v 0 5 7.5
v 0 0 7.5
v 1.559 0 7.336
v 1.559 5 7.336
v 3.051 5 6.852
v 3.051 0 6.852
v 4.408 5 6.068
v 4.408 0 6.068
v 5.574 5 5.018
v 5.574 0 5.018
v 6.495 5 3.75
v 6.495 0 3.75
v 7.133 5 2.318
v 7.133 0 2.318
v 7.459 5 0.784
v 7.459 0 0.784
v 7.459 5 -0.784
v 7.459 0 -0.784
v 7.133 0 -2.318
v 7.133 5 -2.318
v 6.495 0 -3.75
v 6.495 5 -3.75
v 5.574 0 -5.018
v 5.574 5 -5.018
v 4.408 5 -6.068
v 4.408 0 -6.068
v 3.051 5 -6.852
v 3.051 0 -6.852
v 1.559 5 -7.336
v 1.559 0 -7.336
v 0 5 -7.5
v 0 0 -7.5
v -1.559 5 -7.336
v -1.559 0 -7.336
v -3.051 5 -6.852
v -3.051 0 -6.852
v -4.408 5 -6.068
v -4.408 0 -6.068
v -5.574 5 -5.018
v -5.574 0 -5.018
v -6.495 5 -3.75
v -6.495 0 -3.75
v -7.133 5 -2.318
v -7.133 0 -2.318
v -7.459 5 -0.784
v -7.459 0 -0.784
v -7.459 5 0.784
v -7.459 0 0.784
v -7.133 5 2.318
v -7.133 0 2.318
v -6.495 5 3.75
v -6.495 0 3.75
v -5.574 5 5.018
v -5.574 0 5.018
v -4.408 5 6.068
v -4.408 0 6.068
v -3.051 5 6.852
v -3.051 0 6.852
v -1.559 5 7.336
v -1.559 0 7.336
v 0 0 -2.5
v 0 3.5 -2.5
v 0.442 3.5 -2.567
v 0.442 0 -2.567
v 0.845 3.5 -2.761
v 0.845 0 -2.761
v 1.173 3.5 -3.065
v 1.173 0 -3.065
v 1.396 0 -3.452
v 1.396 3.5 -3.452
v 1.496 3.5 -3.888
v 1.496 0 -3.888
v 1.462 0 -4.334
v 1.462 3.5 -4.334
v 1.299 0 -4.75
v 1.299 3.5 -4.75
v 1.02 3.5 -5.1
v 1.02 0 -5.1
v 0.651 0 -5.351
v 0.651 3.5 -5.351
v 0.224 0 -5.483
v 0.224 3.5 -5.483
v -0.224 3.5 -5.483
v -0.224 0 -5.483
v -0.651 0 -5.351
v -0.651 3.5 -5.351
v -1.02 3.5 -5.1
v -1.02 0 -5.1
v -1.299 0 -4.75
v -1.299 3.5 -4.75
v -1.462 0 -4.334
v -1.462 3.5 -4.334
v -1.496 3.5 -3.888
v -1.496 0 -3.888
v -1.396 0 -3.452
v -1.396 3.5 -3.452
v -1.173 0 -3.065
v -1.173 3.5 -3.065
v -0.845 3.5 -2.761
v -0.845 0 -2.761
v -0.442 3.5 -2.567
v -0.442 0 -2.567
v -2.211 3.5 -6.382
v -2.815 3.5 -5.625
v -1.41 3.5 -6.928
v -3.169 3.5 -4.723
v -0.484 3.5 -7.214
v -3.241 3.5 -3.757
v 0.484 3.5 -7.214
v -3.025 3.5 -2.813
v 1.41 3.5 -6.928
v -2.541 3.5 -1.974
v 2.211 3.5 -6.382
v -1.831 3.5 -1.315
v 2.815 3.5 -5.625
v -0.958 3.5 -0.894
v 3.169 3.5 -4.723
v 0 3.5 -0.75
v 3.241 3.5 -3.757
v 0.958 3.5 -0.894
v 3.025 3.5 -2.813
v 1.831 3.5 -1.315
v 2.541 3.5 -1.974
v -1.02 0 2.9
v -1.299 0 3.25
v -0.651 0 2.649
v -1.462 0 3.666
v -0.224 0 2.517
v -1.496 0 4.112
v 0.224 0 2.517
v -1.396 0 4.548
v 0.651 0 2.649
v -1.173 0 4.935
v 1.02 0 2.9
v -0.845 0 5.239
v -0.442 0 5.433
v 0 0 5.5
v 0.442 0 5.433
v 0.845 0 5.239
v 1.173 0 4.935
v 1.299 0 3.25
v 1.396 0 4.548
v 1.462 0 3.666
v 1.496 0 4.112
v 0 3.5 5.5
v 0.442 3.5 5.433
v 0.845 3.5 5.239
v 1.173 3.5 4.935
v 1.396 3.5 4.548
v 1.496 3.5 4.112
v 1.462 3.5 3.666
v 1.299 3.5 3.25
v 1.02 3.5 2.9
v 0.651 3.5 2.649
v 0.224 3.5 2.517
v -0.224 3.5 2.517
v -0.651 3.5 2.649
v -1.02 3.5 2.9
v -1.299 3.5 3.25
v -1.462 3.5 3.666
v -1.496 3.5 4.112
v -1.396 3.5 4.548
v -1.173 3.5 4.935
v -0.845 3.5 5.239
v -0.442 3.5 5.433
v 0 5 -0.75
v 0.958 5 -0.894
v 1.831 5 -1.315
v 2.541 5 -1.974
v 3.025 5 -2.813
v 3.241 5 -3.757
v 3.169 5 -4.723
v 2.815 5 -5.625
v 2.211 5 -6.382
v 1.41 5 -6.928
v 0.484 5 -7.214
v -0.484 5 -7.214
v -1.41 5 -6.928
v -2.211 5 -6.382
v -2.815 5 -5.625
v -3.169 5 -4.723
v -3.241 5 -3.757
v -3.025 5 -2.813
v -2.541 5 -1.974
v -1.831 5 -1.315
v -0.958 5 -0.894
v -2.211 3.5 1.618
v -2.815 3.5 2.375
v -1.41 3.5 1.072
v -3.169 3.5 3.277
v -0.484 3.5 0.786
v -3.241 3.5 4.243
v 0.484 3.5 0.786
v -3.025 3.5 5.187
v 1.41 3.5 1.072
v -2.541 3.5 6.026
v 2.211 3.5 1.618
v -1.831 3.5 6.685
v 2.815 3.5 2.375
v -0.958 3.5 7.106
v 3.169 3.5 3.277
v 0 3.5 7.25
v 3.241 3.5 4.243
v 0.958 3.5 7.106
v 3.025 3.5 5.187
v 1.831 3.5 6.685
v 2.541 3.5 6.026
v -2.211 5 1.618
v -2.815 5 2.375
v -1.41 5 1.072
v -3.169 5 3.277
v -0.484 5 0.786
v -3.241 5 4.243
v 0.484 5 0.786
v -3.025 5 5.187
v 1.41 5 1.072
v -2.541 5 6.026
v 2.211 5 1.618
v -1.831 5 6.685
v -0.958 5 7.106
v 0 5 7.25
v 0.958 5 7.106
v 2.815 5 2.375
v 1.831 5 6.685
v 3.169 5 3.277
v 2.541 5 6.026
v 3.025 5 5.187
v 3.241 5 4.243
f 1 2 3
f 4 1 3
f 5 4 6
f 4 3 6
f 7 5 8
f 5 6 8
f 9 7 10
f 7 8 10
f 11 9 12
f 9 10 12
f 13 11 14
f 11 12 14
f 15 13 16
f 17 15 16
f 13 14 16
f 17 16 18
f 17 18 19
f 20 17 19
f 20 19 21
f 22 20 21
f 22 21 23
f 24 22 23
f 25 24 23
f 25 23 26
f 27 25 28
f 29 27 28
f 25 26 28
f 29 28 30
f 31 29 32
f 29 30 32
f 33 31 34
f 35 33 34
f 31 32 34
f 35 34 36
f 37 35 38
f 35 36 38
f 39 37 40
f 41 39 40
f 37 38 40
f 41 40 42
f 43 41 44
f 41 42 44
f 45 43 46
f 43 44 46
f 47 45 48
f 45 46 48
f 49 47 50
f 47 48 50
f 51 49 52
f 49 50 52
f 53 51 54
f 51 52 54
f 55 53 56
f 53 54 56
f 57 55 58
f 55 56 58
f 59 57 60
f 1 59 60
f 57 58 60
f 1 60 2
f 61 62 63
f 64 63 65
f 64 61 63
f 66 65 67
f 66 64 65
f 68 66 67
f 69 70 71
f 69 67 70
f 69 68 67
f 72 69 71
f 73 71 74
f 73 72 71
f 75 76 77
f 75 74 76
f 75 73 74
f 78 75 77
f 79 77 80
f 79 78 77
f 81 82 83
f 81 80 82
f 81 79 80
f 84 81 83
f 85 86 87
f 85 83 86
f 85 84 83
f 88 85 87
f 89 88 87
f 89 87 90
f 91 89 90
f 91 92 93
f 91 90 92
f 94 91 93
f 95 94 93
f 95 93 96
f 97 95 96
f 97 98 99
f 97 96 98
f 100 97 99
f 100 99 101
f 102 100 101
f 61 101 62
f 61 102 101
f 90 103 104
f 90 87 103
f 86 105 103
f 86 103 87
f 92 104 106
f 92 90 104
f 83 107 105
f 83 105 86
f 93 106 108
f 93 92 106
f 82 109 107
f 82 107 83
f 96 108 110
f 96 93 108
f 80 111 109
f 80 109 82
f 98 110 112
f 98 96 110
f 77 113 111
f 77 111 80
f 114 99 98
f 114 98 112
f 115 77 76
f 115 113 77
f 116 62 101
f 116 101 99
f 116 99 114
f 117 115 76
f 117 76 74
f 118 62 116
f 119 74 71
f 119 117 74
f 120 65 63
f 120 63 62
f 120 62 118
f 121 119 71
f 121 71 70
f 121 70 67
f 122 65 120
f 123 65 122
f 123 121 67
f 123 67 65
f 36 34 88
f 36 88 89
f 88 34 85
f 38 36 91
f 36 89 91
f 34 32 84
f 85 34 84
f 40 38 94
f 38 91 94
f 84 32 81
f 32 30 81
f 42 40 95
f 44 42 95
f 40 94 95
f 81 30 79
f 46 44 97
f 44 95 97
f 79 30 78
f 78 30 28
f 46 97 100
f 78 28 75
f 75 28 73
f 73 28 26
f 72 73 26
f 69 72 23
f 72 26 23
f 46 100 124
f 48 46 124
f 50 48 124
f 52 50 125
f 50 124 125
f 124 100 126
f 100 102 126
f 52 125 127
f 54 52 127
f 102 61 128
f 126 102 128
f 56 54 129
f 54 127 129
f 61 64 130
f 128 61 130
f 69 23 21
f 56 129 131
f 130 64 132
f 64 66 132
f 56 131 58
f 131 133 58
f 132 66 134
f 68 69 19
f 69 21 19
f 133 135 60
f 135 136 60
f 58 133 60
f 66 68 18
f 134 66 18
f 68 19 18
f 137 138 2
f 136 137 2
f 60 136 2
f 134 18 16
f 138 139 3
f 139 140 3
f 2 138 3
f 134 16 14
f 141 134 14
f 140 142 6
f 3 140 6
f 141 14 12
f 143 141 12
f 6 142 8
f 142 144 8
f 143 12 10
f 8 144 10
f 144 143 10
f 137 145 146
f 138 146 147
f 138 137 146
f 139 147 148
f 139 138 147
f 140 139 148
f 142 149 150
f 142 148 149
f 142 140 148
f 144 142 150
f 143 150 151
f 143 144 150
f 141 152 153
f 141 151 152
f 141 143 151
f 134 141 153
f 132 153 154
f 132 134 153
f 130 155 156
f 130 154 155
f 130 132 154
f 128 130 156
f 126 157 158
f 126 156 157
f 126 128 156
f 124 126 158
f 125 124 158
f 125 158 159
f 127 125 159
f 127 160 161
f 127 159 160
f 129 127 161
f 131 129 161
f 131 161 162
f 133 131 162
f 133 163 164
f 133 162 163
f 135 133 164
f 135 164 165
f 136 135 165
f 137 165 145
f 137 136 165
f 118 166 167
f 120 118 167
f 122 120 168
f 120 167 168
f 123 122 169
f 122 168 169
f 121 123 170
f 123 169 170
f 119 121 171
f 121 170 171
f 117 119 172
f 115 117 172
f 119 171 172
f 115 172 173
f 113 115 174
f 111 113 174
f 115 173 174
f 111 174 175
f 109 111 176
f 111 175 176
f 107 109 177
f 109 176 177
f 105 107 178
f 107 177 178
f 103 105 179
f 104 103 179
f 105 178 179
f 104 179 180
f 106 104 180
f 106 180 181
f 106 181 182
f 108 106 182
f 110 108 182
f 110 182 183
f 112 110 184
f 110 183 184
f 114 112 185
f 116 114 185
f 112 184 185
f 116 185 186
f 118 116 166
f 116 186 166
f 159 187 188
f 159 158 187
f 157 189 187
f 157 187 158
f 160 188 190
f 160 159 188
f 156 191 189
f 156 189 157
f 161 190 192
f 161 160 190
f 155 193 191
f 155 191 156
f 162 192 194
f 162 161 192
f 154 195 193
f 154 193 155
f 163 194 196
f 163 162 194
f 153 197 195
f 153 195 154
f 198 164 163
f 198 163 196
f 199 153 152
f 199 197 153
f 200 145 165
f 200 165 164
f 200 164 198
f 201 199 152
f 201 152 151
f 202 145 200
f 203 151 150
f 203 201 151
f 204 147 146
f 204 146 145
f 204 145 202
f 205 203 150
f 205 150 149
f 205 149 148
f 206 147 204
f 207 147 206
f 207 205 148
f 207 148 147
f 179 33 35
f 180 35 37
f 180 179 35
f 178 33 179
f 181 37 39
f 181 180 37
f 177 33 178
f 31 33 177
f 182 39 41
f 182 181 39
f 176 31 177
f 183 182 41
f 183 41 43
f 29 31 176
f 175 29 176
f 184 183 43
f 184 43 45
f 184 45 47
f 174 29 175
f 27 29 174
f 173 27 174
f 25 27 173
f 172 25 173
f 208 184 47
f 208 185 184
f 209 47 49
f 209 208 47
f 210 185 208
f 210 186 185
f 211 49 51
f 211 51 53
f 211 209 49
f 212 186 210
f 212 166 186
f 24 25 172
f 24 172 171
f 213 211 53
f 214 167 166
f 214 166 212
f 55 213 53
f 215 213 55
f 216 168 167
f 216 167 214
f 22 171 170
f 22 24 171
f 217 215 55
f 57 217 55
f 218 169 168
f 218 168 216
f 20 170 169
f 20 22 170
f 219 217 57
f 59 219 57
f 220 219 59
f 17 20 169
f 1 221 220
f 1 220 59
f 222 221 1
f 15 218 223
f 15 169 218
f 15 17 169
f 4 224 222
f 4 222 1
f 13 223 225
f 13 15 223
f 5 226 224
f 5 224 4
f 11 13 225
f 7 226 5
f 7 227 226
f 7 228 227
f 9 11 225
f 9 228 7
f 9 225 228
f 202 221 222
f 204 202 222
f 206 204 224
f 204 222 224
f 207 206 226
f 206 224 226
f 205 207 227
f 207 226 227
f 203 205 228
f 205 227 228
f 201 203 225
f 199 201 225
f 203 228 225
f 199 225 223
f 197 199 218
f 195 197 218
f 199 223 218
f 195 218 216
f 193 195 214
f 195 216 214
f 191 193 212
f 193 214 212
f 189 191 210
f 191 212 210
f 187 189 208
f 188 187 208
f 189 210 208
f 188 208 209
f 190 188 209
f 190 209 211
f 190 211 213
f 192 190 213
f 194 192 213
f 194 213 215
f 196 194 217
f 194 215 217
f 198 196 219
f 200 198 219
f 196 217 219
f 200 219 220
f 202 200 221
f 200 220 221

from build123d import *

# Parameters (mm, degrees)
SKETCH1_R           = 7.5
SKETCH1_R_2         = 1.5
BOSS_EXTRUDE1_DEPTH = 5
SKETCH2_R           = 3.25
CUT_EXTRUDE1_DEPTH  = 1.5


with BuildPart() as part:
    # Sketch1 → Boss-Extrude1 (new body)
    with BuildSketch(Plane(origin=(0, 0, 0), x_dir=(1, 0, 0), z_dir=(0, 1, 0))):
        with Locations(Location((0, 0, 0), (0, 0, 270))):
            Circle(SKETCH1_R)
        with Locations(Location((0, 4, 0), (0, 0, 270))):
            Circle(SKETCH1_R_2, mode=Mode.SUBTRACT)
        with Locations(Location((0, -4, 0), (0, 0, 270))):
            Circle(SKETCH1_R_2, mode=Mode.SUBTRACT)
    extrude(amount=BOSS_EXTRUDE1_DEPTH)

    # Sketch2 → Cut-Extrude1 (cut)
    with BuildSketch(Plane(origin=(0, 5, 0), x_dir=(1, 0, 0), z_dir=(0, 1, 0))):
        with Locations(Location((0, 4, 0), (0, 0, 270))):
            Circle(SKETCH2_R)
        with Locations(Location((0, -4, 0), (0, 0, 270))):
            Circle(SKETCH2_R)
    extrude(amount=-CUT_EXTRUDE1_DEPTH, mode=Mode.SUBTRACT)


solid = part.part
